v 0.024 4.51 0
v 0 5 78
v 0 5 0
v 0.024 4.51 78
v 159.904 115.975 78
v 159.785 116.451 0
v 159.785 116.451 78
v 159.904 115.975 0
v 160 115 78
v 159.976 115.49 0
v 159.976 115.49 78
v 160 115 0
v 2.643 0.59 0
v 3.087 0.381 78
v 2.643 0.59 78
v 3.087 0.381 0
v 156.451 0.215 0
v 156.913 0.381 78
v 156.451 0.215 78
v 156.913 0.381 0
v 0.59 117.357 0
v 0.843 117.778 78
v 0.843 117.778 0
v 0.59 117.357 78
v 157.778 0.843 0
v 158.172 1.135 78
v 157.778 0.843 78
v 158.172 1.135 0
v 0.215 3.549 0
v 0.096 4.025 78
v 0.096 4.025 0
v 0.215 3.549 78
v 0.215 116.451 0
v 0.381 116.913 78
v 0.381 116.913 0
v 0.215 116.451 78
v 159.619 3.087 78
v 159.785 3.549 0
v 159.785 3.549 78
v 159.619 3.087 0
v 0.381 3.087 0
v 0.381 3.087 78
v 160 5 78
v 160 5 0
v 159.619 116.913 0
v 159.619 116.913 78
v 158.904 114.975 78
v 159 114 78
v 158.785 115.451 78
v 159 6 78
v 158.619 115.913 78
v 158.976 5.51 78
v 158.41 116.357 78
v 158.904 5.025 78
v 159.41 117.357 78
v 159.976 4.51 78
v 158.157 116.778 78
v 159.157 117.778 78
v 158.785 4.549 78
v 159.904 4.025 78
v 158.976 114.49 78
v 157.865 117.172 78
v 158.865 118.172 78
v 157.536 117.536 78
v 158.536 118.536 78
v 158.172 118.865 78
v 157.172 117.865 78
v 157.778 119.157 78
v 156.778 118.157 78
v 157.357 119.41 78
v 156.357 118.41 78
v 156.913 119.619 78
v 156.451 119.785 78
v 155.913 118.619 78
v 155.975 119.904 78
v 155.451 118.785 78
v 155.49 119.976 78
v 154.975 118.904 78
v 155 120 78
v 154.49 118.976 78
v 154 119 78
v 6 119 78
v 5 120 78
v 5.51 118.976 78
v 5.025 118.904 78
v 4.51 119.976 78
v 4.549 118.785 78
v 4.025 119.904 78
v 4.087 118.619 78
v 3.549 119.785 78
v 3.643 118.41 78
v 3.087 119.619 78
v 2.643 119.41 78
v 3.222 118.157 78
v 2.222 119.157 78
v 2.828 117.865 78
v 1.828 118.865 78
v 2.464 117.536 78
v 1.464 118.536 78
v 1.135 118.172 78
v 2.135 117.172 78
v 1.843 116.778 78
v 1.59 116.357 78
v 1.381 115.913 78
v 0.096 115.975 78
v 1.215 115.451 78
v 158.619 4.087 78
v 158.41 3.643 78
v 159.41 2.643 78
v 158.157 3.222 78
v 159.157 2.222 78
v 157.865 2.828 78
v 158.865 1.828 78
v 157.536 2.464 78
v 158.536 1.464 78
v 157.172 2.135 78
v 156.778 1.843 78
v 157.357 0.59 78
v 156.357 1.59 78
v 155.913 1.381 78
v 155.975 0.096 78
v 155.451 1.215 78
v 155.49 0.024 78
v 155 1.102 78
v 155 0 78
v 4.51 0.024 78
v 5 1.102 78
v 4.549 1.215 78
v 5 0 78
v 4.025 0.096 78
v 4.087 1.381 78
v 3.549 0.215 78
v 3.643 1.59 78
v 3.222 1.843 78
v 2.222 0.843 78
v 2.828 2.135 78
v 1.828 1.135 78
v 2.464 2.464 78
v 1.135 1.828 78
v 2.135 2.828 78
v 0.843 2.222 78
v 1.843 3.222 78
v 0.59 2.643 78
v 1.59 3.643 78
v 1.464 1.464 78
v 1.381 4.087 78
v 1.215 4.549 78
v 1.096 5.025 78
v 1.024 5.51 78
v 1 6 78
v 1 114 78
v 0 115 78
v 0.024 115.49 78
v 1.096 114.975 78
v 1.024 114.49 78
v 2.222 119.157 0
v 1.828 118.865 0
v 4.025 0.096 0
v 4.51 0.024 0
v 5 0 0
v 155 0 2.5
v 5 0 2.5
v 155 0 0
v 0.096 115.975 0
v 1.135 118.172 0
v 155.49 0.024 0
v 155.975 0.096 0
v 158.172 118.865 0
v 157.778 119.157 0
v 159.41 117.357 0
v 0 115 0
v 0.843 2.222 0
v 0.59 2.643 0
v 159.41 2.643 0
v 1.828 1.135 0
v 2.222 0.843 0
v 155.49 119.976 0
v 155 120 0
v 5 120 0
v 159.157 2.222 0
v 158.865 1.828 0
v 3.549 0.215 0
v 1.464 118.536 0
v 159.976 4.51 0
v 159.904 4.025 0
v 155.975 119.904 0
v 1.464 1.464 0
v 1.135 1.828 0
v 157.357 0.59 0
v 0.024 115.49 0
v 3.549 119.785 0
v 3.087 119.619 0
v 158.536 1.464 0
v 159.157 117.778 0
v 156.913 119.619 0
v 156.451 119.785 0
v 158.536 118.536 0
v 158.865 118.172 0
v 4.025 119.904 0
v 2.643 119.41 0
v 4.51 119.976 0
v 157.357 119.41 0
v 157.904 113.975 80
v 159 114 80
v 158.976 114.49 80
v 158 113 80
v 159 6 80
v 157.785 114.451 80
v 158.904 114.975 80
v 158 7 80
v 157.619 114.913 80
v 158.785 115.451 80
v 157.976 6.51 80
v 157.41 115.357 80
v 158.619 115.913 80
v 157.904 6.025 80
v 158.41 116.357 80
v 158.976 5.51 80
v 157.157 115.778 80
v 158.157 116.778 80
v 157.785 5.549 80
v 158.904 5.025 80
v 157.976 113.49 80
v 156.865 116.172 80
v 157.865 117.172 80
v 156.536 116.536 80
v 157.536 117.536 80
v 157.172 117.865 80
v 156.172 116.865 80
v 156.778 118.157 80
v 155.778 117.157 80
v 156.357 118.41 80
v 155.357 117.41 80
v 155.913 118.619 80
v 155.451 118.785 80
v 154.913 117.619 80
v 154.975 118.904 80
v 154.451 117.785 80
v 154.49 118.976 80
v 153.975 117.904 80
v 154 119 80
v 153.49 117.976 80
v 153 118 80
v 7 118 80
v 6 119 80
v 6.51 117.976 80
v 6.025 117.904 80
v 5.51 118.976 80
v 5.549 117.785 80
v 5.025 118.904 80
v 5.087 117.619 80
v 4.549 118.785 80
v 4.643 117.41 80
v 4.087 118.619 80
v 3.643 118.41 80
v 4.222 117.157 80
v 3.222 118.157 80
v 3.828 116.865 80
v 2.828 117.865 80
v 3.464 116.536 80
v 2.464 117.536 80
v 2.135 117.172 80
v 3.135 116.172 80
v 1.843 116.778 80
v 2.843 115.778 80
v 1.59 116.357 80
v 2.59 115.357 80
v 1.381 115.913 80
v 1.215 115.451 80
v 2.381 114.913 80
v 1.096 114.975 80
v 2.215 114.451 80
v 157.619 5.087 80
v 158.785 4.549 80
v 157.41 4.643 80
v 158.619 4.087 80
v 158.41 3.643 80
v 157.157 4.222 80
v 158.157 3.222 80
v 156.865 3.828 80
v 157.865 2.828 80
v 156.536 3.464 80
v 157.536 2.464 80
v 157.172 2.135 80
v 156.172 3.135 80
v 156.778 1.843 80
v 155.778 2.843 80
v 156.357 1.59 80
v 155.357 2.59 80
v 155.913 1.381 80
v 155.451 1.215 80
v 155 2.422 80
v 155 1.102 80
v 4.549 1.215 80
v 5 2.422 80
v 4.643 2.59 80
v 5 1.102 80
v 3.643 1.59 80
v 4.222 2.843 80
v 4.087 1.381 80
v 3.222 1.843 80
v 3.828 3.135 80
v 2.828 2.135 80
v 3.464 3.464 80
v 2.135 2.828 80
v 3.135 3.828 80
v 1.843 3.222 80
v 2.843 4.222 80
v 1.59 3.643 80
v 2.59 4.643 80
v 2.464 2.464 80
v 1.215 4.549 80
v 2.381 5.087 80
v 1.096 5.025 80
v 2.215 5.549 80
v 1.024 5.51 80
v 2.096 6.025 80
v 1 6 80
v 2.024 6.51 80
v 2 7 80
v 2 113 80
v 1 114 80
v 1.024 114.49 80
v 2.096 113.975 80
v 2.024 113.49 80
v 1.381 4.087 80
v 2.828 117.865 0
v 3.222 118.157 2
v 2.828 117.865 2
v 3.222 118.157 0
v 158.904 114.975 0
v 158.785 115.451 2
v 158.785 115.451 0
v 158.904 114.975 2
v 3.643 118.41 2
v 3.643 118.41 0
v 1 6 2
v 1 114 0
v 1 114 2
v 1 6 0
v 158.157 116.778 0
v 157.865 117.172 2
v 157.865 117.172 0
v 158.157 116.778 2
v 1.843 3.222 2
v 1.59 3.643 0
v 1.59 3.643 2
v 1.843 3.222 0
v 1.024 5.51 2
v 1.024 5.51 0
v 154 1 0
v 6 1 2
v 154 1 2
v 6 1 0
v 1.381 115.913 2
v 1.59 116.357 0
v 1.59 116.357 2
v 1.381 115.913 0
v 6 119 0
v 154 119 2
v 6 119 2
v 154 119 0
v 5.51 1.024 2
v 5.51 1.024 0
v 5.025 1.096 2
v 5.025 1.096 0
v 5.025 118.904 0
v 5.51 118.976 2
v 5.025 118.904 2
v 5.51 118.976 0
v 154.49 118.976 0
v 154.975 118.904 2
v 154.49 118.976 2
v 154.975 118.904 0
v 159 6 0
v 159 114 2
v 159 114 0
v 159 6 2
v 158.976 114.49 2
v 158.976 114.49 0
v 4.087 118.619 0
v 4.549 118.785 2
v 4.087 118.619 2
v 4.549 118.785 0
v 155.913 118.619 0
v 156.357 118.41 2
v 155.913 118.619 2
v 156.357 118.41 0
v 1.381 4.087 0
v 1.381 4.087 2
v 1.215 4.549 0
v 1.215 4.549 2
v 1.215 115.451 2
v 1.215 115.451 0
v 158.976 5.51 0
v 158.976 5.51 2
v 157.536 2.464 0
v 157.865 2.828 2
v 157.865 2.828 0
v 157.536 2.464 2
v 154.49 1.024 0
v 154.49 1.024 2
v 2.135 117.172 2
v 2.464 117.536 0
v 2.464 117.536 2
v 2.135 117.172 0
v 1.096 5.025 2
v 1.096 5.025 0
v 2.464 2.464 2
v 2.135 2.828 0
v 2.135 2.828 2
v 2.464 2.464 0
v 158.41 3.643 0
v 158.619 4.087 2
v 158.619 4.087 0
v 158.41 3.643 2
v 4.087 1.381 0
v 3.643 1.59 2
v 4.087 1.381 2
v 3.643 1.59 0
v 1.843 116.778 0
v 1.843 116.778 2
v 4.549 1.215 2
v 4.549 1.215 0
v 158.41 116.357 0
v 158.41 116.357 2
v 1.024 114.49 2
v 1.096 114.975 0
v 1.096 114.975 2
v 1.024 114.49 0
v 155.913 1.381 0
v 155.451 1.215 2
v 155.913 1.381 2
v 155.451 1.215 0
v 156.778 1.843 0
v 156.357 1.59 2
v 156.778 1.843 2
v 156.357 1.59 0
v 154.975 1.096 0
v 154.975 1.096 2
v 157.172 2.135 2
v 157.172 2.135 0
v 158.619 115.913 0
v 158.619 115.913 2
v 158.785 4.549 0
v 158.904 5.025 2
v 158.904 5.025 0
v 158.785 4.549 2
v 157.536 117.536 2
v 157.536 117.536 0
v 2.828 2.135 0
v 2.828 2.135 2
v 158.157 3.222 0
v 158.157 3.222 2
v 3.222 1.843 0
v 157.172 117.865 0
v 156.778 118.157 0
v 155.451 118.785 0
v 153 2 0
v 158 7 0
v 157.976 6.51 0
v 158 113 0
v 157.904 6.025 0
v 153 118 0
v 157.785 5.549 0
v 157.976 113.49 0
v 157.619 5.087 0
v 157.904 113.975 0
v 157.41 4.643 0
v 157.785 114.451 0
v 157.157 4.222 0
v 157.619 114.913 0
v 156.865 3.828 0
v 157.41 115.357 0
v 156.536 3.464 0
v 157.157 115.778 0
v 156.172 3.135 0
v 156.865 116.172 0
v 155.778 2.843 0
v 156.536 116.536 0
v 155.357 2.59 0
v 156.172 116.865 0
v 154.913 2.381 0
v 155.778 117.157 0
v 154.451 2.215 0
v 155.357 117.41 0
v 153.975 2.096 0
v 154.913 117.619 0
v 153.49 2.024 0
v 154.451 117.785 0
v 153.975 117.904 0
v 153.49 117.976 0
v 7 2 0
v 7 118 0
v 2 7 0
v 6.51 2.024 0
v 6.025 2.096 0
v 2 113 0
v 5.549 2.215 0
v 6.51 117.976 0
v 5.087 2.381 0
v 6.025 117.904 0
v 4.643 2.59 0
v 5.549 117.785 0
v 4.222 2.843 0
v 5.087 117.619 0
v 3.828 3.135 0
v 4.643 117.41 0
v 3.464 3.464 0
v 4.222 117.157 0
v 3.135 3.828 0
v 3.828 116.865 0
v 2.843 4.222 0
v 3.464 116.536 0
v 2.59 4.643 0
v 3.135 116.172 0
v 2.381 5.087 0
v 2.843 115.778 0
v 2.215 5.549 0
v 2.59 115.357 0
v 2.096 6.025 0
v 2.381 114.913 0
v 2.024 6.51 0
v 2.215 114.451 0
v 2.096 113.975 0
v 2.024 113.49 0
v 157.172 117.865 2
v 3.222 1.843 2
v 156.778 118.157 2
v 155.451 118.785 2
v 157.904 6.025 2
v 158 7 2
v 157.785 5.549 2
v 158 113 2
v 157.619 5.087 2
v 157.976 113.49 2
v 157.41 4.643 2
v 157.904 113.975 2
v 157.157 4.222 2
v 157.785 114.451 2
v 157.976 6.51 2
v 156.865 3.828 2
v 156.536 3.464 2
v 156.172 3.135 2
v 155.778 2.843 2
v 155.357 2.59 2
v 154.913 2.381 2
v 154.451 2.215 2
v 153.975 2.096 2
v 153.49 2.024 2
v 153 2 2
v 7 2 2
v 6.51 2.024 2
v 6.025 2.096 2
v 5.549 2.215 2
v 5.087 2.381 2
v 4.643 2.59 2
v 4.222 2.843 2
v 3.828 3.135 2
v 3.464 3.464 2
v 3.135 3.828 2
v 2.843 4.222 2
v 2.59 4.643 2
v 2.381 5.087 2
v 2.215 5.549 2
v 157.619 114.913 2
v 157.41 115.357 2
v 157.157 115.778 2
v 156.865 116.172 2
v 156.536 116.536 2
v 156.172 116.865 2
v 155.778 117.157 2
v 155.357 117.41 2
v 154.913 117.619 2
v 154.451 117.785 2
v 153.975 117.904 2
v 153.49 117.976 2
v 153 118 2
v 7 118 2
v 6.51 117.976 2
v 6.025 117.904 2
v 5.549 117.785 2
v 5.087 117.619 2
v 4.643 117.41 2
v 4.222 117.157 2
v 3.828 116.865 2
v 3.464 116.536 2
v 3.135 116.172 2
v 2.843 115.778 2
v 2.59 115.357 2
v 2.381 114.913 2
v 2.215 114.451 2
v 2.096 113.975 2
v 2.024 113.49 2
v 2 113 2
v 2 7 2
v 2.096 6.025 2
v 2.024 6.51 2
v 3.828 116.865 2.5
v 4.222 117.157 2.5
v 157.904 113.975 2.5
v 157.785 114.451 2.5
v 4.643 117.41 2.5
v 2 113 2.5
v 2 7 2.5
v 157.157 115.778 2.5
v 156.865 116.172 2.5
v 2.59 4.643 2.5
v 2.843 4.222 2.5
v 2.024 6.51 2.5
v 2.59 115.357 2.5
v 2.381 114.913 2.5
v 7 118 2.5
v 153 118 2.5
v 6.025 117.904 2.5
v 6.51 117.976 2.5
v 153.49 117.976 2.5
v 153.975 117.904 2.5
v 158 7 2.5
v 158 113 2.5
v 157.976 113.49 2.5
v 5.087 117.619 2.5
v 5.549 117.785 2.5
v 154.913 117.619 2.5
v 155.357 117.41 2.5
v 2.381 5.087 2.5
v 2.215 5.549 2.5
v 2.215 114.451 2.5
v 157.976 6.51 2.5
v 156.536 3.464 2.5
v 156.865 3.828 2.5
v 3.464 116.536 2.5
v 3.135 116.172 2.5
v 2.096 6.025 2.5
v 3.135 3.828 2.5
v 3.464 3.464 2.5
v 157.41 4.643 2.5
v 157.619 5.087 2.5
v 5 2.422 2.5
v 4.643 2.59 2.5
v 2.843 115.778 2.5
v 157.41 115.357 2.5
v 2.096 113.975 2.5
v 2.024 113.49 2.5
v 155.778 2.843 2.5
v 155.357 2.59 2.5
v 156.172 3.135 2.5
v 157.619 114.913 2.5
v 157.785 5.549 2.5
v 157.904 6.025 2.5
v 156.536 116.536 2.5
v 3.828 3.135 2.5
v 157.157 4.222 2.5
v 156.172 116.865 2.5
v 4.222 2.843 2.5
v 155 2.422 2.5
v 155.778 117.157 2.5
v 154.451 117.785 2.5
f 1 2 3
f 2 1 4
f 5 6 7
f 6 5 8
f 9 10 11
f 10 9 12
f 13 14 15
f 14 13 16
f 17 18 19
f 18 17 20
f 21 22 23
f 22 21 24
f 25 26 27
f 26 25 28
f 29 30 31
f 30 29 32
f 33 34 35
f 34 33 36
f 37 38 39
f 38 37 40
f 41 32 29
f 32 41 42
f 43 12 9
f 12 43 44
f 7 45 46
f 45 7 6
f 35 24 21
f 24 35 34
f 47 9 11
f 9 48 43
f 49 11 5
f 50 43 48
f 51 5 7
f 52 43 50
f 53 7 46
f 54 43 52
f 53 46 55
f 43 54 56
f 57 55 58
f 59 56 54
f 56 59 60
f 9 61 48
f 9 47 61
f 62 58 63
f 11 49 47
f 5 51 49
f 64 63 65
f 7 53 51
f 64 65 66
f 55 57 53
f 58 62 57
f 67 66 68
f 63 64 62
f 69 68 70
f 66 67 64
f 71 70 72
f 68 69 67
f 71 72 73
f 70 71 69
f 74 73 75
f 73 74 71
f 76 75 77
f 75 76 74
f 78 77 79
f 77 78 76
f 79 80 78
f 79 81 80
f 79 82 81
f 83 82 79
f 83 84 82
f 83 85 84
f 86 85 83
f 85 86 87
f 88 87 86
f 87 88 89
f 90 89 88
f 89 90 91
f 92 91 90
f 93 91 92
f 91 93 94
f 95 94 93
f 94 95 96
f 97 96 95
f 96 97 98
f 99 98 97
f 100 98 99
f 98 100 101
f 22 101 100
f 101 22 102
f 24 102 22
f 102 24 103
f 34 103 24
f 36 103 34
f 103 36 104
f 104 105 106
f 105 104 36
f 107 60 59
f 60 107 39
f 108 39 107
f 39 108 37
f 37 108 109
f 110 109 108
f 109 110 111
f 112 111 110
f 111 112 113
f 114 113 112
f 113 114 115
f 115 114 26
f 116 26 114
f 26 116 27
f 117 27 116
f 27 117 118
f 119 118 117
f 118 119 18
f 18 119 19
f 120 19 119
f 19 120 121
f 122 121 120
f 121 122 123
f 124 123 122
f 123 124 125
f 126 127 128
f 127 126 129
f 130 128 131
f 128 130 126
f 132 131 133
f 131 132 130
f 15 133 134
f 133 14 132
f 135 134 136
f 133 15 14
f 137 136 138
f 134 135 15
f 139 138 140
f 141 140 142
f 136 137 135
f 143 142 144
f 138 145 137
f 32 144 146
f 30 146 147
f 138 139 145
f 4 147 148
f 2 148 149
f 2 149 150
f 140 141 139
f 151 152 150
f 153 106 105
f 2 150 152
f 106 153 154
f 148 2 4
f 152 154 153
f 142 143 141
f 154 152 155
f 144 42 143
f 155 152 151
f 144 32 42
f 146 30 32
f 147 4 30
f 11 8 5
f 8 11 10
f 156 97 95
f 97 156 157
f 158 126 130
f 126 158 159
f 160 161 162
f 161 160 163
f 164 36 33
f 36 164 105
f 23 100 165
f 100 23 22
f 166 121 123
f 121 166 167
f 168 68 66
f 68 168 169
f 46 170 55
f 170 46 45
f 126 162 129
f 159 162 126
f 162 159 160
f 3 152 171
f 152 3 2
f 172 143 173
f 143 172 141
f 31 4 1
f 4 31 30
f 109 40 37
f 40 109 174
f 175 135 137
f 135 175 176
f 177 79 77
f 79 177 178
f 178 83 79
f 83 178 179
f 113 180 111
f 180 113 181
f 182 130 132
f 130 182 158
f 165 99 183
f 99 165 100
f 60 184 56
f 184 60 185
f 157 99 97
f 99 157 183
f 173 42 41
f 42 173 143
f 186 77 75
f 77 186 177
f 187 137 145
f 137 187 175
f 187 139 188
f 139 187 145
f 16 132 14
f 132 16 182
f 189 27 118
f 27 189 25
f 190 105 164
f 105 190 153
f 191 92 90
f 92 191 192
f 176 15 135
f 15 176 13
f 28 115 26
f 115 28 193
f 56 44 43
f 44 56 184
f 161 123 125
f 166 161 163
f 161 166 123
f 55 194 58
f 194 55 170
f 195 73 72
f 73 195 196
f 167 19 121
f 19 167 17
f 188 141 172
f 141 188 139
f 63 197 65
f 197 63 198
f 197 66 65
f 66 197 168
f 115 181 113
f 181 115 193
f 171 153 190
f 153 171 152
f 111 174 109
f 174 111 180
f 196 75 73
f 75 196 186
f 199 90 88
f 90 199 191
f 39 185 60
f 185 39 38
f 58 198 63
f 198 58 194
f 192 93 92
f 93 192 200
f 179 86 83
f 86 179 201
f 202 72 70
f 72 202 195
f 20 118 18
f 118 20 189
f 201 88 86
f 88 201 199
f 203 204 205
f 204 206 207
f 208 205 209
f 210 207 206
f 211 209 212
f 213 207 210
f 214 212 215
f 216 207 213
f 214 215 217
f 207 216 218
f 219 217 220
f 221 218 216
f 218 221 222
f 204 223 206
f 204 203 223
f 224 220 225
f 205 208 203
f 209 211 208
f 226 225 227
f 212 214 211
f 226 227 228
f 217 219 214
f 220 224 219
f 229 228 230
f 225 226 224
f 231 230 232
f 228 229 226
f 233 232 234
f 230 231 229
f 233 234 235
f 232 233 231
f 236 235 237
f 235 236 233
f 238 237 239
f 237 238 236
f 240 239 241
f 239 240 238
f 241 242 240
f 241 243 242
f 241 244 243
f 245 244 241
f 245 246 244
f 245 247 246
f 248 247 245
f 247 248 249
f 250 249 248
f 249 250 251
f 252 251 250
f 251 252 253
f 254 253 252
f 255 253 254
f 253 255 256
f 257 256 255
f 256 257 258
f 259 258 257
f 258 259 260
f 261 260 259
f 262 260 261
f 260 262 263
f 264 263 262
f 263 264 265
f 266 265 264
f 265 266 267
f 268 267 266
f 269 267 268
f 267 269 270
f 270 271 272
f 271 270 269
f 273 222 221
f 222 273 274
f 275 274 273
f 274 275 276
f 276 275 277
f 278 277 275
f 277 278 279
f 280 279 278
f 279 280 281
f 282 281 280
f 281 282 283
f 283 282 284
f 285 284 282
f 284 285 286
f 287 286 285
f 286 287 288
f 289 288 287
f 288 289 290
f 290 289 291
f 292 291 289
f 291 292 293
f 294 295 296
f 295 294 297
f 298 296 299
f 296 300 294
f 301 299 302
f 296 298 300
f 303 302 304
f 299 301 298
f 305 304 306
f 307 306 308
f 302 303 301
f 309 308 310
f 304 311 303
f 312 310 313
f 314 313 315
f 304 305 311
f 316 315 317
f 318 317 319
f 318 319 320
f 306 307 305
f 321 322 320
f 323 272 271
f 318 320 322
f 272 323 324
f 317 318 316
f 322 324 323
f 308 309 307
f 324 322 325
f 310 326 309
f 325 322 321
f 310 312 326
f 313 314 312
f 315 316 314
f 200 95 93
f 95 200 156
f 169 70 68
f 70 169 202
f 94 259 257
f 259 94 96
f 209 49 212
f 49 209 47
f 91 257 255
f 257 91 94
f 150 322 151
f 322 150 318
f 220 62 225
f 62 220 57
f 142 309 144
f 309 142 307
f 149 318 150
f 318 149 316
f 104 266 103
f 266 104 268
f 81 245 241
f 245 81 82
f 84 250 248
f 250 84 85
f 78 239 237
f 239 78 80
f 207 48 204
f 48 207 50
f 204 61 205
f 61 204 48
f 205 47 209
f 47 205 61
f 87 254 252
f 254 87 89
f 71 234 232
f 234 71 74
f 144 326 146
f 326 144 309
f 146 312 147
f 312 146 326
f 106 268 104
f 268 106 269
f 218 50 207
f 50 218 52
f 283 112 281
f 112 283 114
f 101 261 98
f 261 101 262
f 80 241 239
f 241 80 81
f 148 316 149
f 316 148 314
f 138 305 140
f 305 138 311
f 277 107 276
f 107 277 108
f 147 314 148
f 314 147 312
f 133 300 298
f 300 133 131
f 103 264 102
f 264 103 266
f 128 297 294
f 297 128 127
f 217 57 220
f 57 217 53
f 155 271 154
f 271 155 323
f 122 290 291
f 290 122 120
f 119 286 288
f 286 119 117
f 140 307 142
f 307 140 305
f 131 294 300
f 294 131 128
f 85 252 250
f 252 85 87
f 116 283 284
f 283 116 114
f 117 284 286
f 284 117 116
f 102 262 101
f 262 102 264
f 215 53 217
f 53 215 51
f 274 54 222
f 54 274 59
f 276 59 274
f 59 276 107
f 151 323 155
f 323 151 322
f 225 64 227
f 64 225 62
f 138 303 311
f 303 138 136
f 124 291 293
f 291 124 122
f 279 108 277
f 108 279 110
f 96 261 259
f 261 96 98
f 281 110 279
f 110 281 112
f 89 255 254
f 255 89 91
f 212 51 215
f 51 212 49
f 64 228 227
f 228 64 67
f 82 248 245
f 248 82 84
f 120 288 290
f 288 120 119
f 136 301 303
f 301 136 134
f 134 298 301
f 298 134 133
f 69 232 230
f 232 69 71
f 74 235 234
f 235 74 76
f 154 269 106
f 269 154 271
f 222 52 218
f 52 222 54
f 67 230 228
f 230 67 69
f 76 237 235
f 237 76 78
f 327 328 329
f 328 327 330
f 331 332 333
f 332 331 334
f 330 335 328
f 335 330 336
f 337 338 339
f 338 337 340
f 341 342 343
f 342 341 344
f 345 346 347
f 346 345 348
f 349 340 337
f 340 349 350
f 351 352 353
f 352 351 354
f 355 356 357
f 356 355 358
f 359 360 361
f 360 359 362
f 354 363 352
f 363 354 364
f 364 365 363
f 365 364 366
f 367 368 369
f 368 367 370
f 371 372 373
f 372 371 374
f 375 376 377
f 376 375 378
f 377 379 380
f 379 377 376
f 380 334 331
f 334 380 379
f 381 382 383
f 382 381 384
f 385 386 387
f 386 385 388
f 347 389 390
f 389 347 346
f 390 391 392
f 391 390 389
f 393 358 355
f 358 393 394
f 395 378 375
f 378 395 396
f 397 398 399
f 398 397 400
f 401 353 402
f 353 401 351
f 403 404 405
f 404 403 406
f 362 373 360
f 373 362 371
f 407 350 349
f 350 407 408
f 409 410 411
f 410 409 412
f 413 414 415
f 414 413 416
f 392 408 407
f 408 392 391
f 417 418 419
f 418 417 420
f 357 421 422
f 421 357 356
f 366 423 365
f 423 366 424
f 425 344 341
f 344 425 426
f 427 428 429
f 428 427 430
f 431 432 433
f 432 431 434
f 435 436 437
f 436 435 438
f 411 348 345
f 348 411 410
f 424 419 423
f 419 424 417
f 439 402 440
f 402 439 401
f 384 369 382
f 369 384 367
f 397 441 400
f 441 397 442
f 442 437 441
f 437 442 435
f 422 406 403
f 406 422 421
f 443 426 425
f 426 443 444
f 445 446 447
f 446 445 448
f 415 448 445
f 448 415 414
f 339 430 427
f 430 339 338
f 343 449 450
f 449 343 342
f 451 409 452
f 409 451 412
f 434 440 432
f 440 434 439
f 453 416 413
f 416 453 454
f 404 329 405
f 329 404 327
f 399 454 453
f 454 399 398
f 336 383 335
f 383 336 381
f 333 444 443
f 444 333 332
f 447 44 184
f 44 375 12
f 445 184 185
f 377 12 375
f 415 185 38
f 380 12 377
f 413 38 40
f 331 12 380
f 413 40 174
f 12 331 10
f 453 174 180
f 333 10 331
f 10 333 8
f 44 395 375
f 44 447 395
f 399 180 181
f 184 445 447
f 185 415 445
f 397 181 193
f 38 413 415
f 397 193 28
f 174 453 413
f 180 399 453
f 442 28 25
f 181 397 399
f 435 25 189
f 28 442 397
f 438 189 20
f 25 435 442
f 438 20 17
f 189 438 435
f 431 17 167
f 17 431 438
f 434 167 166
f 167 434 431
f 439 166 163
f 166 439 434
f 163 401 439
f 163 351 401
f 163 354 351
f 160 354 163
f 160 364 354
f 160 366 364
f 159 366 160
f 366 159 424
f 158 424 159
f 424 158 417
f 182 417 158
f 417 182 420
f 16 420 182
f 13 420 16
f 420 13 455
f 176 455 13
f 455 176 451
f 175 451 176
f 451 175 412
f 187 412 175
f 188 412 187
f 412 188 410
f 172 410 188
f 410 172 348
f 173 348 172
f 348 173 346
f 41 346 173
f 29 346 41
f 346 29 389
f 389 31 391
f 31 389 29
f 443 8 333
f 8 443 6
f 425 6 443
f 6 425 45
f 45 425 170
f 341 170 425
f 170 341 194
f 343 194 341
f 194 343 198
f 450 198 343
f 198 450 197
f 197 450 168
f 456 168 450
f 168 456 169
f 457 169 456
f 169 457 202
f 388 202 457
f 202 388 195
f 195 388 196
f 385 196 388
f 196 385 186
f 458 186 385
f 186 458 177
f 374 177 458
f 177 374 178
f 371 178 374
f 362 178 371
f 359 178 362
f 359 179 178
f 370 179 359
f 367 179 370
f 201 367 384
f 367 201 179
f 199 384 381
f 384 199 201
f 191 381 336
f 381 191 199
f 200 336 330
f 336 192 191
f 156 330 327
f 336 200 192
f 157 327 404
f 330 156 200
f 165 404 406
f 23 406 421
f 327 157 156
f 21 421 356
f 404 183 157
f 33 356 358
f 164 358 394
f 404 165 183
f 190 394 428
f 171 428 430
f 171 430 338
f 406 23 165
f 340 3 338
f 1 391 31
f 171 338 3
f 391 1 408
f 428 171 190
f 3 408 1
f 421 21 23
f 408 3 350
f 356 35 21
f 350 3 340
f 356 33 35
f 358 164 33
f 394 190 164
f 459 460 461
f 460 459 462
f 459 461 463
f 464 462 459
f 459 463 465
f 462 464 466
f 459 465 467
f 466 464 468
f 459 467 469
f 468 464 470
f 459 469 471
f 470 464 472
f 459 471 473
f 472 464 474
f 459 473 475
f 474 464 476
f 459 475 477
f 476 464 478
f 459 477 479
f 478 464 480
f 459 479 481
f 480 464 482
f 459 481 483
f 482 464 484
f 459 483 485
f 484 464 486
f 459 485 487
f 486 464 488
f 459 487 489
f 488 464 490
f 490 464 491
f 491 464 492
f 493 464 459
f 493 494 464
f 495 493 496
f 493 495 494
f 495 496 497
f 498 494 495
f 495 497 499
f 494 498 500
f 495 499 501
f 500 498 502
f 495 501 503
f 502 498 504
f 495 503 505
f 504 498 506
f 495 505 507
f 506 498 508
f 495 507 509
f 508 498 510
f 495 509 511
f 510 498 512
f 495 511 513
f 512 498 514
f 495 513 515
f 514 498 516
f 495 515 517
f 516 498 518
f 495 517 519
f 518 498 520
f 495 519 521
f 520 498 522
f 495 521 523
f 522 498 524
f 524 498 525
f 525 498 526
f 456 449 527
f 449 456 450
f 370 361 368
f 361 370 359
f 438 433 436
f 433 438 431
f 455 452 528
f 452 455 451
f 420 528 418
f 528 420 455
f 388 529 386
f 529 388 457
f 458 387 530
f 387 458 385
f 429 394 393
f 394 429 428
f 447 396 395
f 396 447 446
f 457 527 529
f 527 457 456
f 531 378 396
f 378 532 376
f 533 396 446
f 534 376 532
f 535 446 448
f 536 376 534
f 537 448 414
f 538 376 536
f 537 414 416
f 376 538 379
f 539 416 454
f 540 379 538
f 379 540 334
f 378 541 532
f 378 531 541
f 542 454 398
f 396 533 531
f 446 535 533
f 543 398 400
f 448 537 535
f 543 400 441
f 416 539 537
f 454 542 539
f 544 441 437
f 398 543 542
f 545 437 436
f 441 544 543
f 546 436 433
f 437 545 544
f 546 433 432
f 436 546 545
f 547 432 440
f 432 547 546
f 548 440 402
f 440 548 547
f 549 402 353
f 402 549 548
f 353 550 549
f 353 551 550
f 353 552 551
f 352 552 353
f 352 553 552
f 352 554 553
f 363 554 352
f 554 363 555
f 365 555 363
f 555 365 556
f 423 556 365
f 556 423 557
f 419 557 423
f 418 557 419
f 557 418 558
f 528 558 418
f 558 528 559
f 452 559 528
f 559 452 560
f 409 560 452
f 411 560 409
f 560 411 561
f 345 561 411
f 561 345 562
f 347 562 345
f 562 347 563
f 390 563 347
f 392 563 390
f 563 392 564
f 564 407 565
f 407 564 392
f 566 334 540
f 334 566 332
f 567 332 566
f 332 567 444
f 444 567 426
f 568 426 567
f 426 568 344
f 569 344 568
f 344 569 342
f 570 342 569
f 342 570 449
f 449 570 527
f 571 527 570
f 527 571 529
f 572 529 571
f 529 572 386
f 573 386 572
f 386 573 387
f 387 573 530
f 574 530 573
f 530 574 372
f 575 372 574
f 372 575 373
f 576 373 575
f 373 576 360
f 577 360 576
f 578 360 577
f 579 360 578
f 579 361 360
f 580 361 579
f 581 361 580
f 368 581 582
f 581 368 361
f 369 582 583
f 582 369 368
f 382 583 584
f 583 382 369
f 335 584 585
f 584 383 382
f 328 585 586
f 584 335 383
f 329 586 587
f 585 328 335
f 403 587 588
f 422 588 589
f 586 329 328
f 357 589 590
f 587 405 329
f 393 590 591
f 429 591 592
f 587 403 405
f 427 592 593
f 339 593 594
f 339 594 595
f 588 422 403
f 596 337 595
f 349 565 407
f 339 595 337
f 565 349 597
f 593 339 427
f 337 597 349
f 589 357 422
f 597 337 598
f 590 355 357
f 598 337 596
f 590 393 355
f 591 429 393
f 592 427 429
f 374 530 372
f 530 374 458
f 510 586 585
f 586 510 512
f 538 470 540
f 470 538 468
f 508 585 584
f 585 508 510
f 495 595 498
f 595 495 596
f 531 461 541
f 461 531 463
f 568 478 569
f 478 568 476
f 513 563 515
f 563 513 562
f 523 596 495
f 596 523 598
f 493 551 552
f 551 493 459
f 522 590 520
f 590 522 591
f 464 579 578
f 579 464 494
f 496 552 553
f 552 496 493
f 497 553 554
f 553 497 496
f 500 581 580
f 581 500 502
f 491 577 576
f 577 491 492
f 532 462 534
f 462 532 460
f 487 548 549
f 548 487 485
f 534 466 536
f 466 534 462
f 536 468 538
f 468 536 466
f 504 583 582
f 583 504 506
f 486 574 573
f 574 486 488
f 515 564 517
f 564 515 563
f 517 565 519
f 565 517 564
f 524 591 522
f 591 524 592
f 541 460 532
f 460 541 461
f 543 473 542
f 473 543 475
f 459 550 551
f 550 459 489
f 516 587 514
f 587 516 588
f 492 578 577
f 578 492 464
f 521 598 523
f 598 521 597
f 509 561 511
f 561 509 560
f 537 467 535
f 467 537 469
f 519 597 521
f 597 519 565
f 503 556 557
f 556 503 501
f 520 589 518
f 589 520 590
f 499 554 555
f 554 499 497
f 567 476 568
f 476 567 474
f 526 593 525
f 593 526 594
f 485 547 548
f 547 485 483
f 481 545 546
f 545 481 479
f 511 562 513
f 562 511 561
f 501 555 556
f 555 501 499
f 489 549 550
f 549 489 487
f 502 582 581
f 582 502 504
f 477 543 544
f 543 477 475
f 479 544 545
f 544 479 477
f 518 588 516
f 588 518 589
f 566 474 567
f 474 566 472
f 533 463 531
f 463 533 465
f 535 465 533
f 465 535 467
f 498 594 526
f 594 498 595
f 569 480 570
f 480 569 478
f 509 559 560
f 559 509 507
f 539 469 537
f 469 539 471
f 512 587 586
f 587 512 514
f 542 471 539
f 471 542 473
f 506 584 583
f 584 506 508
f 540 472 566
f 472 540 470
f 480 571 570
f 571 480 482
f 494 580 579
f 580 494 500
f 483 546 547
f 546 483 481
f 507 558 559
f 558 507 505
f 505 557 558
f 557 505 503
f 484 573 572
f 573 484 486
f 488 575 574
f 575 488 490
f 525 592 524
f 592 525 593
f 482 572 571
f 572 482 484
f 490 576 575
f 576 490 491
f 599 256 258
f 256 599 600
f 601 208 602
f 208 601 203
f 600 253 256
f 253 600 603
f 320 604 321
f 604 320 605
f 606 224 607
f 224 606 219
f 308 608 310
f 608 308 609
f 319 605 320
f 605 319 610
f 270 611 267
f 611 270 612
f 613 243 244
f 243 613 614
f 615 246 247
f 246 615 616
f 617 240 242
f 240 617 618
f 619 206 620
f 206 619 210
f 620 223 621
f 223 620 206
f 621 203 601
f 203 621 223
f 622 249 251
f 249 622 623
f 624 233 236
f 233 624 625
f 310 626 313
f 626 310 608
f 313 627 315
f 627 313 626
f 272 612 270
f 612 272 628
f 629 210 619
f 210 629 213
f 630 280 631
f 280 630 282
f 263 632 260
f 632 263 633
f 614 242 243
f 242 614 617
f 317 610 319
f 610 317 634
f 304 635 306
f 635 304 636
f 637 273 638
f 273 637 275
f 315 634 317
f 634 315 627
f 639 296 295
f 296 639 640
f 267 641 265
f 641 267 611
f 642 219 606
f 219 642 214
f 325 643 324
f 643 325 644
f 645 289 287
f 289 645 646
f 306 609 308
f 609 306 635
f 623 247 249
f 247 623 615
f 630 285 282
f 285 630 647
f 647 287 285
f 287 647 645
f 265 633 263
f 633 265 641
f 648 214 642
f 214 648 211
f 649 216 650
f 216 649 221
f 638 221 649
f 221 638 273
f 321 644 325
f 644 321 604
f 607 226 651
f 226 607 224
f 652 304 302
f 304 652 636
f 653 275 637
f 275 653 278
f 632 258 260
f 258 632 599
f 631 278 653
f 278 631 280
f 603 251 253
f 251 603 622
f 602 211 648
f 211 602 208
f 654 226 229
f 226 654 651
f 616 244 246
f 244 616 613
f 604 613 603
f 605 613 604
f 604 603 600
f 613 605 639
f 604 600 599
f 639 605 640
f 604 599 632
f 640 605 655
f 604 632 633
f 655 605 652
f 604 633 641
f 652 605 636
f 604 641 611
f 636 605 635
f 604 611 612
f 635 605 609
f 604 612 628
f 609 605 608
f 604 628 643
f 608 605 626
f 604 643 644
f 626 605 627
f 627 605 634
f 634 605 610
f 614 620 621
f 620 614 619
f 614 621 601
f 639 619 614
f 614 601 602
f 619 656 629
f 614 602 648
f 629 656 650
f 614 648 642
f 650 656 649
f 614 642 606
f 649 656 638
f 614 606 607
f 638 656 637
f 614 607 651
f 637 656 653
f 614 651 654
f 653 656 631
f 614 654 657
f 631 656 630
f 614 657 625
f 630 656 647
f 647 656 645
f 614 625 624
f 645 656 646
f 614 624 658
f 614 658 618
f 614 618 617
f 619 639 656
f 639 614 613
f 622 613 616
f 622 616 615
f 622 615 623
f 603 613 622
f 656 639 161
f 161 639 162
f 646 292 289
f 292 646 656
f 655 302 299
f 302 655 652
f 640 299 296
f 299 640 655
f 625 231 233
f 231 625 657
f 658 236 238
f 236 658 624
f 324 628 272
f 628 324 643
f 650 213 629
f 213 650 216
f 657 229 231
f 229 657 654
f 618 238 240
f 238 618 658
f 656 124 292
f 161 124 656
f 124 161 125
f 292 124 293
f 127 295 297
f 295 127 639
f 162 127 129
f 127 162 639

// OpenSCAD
// ========================
// Parameters
// ========================
corner_r = 5;    // PCB corner radius

wall_thickness = 2;  // Wall thickness
$fn = 64;              // smooth corners


// Case
case_width = 160;
case_lenght = 120;
case_height = 80;

border_height = 2;

// Outer cylinder
outer_r = 3;
outer_h = 4;

// Inner hole
hole_r = 3;
hole_h = 2;

// USB-C connector
usbc_l = 10;
usbc_h = 5;

// LED
led_r = 5;

// increase for smoother cone ($fn)
segments = 64;

net = false;

// ========================
// Case Top Module
// ========================
module case_top() {

    // Translate so inner PCB pocket starts at (0,0)
    translate([corner_r, corner_r, 0]) {
        difference() {
            
            // Outer shell (walls included)
            linear_extrude(height = case_height)
                rounded_rect(case_width,
                             case_lenght,
                             corner_r);

            // Main hollow interior
            translate([wall_thickness, wall_thickness, border_height+0.5])
                linear_extrude(height = case_height-2)
                    rounded_rect(case_width-2*wall_thickness, case_lenght-2*wall_thickness, corner_r);
            
            border_top();
            
            border_bottom();
            
            // Open one of the sides
            translate([0, -corner_r, border_height+0.5])
                cube([case_width-2*corner_r,wall_thickness+1,case_height-border_height-0.5]);
            
            // Net
            if (true == net) {
                cube_size = 8;
                gap = 2;
                pitch = cube_size + gap;
                matrix_x  = (case_width - 2*corner_r) / pitch;
                matrix_y  = (case_lenght - 2*corner_r) / pitch;
                start_pos = gap/2;
                for (x = [0 : matrix_x-1]) {
                    for (y = [0 : matrix_y-1]) {
                        translate([start_pos+x * pitch, start_pos+y * pitch, 0])
                            cube(cube_size);
                    }
                }
            }
        }
    }
}

module border_top() {
    difference() {
        // Top hollow interior
        translate([0, 0, case_height-2])
            linear_extrude(height = border_height)
                rounded_rect(case_width, case_lenght, corner_r);
        translate([1, 1, case_height-2])
            linear_extrude(height = border_height)
                rounded_rect(case_width-2, case_lenght-2, corner_r);
        
    }
}

module border_bottom() {
    difference() {
        // Top hollow interior
        translate([1, 1, 0])
            linear_extrude(height = border_height)
                rounded_rect(case_width-2, case_lenght-2, corner_r);
        translate([2, 2, 0])
            linear_extrude(height = border_height)
                rounded_rect(case_width-4, case_lenght-4, corner_r);
        
    }
}

// ========================
// Rounded rectangle module
// ========================
module rounded_rect(x, y, radius) {
    minkowski() {
        square([x - 2*radius, y - 2*radius], center = false);
        circle(r = radius, $fn = $fn);
    }
}

// Helper functions
function sum_first(arr, n) =
    n == 0 ? 0 : arr[n - 1] + sum_first(arr, n - 1);

// ========================
// Top case
// ========================

case_top();

// -------------------- PARAMETERS --------------------
ratios = [1];   // must sum to 1

availableSpace = case_width-2*wall_thickness;             // total X space
//wall_thickness = 3;               // x
//case_length = 100;                // y
//case_height = 50;                 // z

wall_height = case_height - 2 - 2.5;

echo("Total: ");
echo(availableSpace);

// -------------------- WALL GENERATION --------------------
if (1 < len(ratios)) {
    for (i = [0 : len(ratios) - 2]) {   // no wall for last element

        space = ratios[i] * availableSpace;

        // cumulative space before this element
        x_cursor = sum_first(
            [for (j = [0 : len(ratios) - 1]) ratios[j] * availableSpace],
            i
        ) + len(ratios)-1 * wall_thickness;

        wall_pos = x_cursor + space - wall_thickness / 2;

        echo("i =", i);
        echo("space =", space);
        echo("x_cursor =", x_cursor);
        echo("wall_pos =", wall_pos);

        translate([
            wall_pos,
            0,
            2.5
        ])
            cube([
                wall_thickness,
                case_lenght - 2,
                wall_height
            ]);
    }
}
